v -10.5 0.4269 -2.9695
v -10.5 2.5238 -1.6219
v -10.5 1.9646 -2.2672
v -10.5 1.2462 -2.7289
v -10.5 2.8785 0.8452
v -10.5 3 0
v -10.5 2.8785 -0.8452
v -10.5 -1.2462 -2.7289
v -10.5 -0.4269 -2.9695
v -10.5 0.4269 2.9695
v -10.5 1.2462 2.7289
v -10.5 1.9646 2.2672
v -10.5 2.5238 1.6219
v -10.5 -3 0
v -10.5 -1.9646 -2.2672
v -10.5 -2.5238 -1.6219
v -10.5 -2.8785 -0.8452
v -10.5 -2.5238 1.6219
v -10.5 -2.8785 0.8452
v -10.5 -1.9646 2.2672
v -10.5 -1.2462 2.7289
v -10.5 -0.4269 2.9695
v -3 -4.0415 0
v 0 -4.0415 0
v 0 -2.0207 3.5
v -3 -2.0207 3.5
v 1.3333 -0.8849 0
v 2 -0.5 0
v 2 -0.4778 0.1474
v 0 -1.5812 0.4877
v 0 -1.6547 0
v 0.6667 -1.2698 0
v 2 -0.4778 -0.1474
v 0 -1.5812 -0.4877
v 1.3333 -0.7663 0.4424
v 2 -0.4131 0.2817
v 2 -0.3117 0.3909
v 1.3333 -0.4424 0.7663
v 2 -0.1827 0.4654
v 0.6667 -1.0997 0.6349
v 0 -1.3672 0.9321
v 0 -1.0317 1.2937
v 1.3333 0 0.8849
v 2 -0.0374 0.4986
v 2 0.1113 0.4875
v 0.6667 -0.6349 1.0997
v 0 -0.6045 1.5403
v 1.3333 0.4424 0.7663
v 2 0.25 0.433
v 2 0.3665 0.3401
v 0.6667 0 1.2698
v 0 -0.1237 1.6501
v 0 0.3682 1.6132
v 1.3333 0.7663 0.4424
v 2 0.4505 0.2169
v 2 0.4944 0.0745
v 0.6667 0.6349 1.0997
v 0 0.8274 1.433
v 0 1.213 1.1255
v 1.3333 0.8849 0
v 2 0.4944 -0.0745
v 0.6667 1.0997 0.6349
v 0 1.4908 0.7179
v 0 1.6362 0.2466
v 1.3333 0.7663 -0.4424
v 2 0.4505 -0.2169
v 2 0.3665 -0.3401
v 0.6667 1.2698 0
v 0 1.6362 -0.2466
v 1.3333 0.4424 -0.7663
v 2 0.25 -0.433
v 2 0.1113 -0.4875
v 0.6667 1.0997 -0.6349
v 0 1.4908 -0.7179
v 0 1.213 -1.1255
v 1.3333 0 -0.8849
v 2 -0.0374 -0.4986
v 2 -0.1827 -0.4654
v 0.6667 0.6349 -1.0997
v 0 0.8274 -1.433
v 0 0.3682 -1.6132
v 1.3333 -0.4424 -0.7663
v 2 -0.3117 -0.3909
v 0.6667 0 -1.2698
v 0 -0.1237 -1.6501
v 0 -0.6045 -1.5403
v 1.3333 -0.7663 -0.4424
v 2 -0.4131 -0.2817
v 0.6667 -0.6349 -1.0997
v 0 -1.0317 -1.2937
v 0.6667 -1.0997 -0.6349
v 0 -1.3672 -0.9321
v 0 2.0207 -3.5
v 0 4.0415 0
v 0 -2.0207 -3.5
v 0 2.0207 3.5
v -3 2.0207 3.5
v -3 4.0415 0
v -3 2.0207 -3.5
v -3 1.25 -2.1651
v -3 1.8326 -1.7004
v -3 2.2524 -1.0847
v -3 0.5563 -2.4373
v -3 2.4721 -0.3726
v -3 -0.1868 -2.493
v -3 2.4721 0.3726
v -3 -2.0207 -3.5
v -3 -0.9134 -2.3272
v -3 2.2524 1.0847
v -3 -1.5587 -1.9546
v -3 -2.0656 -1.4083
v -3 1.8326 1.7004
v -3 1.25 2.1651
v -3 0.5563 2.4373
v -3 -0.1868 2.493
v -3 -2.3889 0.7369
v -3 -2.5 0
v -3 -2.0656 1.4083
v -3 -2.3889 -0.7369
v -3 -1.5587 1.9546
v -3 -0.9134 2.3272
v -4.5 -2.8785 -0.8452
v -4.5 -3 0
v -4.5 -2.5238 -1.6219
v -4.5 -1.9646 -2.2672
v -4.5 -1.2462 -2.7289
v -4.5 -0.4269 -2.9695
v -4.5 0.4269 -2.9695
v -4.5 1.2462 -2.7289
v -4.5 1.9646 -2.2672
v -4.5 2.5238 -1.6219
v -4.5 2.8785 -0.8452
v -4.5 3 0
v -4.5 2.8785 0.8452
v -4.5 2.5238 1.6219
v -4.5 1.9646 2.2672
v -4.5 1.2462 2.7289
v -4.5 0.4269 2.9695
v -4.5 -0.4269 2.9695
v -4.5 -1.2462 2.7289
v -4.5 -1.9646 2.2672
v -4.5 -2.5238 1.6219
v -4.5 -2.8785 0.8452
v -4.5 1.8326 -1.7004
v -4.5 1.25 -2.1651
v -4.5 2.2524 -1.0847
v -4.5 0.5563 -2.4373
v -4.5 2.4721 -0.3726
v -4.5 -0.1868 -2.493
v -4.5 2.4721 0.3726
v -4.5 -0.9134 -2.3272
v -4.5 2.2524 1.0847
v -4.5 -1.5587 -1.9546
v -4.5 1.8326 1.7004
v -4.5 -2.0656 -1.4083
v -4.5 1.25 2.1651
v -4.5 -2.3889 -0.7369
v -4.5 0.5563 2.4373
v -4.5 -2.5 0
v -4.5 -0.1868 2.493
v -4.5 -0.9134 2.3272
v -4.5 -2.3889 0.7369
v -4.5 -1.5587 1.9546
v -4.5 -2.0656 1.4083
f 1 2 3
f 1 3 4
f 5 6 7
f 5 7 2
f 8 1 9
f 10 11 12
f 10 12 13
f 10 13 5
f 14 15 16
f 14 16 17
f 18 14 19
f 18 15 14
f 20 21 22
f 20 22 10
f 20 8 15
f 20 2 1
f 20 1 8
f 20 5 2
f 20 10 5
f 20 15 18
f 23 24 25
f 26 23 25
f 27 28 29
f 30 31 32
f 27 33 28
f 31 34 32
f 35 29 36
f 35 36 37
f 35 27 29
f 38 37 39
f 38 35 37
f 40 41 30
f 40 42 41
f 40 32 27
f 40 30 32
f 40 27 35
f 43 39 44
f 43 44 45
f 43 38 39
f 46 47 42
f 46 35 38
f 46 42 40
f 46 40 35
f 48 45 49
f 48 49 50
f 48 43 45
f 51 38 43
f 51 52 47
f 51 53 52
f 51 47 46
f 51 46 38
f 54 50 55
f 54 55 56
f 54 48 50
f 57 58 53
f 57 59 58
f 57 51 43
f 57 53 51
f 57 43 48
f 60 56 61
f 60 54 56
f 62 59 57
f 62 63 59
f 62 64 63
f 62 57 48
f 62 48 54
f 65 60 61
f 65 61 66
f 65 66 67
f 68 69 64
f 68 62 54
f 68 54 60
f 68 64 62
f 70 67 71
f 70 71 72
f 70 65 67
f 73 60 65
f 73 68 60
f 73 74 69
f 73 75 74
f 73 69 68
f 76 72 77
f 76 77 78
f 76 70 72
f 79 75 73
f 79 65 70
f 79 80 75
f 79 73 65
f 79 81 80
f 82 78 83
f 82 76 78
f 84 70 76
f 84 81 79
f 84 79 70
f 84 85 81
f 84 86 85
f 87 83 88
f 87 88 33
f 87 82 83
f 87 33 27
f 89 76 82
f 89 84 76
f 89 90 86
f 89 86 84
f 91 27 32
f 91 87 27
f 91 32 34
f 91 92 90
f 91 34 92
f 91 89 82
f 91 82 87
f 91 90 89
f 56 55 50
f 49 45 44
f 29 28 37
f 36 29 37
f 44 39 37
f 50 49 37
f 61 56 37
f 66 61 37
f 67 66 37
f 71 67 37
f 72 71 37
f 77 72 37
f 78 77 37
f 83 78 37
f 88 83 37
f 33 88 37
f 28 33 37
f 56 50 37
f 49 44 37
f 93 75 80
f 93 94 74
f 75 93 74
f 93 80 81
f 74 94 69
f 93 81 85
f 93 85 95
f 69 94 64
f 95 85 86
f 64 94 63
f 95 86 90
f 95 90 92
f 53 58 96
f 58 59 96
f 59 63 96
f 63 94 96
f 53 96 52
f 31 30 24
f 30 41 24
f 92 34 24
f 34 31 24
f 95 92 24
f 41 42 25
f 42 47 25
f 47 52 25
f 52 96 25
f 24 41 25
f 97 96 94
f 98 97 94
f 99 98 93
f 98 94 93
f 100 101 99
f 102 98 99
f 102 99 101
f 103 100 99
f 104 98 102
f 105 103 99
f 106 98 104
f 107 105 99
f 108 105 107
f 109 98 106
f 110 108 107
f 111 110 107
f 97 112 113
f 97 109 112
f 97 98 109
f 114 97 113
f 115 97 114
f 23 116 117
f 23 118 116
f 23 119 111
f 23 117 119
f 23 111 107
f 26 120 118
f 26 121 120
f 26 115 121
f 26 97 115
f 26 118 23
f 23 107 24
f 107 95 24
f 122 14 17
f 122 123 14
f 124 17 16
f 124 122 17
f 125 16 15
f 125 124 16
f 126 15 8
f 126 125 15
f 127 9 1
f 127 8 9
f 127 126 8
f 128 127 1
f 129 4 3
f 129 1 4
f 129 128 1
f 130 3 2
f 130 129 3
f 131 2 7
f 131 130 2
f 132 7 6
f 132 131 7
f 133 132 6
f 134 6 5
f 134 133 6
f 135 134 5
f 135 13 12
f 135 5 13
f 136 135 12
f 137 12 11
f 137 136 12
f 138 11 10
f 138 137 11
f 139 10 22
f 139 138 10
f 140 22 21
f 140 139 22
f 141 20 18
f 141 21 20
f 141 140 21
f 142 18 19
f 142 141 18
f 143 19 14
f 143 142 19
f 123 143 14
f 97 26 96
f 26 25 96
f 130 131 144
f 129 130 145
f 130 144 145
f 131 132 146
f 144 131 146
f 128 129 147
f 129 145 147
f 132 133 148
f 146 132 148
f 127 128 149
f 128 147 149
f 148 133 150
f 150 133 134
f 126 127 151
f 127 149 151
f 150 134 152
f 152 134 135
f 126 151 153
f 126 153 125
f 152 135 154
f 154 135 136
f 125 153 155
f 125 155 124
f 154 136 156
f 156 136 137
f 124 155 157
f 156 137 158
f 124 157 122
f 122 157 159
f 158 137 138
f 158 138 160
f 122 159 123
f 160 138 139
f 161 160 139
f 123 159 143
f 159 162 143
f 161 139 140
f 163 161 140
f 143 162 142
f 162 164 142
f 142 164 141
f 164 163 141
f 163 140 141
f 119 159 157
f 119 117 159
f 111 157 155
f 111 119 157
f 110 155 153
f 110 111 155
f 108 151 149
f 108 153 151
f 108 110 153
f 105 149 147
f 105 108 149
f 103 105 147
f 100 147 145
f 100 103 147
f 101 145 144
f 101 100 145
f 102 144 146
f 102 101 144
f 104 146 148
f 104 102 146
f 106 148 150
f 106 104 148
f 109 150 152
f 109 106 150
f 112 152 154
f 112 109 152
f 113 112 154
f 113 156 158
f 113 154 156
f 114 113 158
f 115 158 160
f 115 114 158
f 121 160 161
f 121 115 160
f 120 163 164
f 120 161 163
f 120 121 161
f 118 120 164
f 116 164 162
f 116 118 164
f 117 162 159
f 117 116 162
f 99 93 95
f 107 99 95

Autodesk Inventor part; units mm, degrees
ref_plane "YZ Plane" through (0, 0, 0) normal (1, 0, 0) x (0, 1, 0)
ref_plane "XZ Plane" through (0, 0, 0) normal (0, 1, 0) x (-1, 0, 0)
ref_plane "XY Plane" through (0, 0, 0) normal (0, 0, 1) x (1, 0, 0)
sketch "Sketch1" plane through (0, 0, 0) normal (0, 0, 1) x (1, 0, 0)
  line L0 (0, 0) -> (-10.5, 0)
  line L1 (-10.5, 0) -> (-10.5, -3)
  line L2 (-10.5, -3) -> (-4.5, -3)
  line L3 (-4.5, -3) -> (-4.5, -2.5)
  line L4 (-4.5, -2.5) -> (-3, -2.5)
  line L5 (-3, -2.5) -> (-3, -10)
  line L6 (-3, -10) -> (0, -10)
  line L7 (0, -10) -> (0, -1.6547)
  line L8 (0, -1.6547) -> (2, -0.5)
  line L9 (2, -0.5) -> (2, 0)
  line L10 (2, 0) -> (0, 0)
  dimension "d0" = 0.5
  dimension "d3" = 3
  dimension "d5" = 2.5
  dimension "d6" = 10
  dimension "d7" = 10.5
  dimension "d8" = 2
  dimension "d9" = 30
  dimension "d10" = 7.5
  dimension "d11" = 6
revolve "Revolution1" add sketch "Sketch1" angle 360 about axis through (0, 0, 0) along (-1, 0, 0)
sketch "Sketch2" plane through (0, 0, 0) normal (1, 0, 0) x (0, 0, -1)
  circle A0 centre (0, 0) radius 10 projected
  circle A1 centre (0, 0) radius 1.6547 projected
  line L0 (0, 4.0415) -> (3.5, 2.0207)
  line L1 (3.5, 2.0207) -> (3.5, -2.0207)
  line L2 (3.5, -2.0207) -> (0, -4.0415)
  line L3 (0, -4.0415) -> (-3.5, -2.0207)
  line L4 (-3.5, -2.0207) -> (-3.5, 2.0207)
  line L5 (-3.5, 2.0207) -> (0, 4.0415)
  dimension "d13" = 7
extrude "Extrusion1" cut sketch "Sketch2" against normal up to surface (3 mm away) contours A0
properties part number "nozzle"
